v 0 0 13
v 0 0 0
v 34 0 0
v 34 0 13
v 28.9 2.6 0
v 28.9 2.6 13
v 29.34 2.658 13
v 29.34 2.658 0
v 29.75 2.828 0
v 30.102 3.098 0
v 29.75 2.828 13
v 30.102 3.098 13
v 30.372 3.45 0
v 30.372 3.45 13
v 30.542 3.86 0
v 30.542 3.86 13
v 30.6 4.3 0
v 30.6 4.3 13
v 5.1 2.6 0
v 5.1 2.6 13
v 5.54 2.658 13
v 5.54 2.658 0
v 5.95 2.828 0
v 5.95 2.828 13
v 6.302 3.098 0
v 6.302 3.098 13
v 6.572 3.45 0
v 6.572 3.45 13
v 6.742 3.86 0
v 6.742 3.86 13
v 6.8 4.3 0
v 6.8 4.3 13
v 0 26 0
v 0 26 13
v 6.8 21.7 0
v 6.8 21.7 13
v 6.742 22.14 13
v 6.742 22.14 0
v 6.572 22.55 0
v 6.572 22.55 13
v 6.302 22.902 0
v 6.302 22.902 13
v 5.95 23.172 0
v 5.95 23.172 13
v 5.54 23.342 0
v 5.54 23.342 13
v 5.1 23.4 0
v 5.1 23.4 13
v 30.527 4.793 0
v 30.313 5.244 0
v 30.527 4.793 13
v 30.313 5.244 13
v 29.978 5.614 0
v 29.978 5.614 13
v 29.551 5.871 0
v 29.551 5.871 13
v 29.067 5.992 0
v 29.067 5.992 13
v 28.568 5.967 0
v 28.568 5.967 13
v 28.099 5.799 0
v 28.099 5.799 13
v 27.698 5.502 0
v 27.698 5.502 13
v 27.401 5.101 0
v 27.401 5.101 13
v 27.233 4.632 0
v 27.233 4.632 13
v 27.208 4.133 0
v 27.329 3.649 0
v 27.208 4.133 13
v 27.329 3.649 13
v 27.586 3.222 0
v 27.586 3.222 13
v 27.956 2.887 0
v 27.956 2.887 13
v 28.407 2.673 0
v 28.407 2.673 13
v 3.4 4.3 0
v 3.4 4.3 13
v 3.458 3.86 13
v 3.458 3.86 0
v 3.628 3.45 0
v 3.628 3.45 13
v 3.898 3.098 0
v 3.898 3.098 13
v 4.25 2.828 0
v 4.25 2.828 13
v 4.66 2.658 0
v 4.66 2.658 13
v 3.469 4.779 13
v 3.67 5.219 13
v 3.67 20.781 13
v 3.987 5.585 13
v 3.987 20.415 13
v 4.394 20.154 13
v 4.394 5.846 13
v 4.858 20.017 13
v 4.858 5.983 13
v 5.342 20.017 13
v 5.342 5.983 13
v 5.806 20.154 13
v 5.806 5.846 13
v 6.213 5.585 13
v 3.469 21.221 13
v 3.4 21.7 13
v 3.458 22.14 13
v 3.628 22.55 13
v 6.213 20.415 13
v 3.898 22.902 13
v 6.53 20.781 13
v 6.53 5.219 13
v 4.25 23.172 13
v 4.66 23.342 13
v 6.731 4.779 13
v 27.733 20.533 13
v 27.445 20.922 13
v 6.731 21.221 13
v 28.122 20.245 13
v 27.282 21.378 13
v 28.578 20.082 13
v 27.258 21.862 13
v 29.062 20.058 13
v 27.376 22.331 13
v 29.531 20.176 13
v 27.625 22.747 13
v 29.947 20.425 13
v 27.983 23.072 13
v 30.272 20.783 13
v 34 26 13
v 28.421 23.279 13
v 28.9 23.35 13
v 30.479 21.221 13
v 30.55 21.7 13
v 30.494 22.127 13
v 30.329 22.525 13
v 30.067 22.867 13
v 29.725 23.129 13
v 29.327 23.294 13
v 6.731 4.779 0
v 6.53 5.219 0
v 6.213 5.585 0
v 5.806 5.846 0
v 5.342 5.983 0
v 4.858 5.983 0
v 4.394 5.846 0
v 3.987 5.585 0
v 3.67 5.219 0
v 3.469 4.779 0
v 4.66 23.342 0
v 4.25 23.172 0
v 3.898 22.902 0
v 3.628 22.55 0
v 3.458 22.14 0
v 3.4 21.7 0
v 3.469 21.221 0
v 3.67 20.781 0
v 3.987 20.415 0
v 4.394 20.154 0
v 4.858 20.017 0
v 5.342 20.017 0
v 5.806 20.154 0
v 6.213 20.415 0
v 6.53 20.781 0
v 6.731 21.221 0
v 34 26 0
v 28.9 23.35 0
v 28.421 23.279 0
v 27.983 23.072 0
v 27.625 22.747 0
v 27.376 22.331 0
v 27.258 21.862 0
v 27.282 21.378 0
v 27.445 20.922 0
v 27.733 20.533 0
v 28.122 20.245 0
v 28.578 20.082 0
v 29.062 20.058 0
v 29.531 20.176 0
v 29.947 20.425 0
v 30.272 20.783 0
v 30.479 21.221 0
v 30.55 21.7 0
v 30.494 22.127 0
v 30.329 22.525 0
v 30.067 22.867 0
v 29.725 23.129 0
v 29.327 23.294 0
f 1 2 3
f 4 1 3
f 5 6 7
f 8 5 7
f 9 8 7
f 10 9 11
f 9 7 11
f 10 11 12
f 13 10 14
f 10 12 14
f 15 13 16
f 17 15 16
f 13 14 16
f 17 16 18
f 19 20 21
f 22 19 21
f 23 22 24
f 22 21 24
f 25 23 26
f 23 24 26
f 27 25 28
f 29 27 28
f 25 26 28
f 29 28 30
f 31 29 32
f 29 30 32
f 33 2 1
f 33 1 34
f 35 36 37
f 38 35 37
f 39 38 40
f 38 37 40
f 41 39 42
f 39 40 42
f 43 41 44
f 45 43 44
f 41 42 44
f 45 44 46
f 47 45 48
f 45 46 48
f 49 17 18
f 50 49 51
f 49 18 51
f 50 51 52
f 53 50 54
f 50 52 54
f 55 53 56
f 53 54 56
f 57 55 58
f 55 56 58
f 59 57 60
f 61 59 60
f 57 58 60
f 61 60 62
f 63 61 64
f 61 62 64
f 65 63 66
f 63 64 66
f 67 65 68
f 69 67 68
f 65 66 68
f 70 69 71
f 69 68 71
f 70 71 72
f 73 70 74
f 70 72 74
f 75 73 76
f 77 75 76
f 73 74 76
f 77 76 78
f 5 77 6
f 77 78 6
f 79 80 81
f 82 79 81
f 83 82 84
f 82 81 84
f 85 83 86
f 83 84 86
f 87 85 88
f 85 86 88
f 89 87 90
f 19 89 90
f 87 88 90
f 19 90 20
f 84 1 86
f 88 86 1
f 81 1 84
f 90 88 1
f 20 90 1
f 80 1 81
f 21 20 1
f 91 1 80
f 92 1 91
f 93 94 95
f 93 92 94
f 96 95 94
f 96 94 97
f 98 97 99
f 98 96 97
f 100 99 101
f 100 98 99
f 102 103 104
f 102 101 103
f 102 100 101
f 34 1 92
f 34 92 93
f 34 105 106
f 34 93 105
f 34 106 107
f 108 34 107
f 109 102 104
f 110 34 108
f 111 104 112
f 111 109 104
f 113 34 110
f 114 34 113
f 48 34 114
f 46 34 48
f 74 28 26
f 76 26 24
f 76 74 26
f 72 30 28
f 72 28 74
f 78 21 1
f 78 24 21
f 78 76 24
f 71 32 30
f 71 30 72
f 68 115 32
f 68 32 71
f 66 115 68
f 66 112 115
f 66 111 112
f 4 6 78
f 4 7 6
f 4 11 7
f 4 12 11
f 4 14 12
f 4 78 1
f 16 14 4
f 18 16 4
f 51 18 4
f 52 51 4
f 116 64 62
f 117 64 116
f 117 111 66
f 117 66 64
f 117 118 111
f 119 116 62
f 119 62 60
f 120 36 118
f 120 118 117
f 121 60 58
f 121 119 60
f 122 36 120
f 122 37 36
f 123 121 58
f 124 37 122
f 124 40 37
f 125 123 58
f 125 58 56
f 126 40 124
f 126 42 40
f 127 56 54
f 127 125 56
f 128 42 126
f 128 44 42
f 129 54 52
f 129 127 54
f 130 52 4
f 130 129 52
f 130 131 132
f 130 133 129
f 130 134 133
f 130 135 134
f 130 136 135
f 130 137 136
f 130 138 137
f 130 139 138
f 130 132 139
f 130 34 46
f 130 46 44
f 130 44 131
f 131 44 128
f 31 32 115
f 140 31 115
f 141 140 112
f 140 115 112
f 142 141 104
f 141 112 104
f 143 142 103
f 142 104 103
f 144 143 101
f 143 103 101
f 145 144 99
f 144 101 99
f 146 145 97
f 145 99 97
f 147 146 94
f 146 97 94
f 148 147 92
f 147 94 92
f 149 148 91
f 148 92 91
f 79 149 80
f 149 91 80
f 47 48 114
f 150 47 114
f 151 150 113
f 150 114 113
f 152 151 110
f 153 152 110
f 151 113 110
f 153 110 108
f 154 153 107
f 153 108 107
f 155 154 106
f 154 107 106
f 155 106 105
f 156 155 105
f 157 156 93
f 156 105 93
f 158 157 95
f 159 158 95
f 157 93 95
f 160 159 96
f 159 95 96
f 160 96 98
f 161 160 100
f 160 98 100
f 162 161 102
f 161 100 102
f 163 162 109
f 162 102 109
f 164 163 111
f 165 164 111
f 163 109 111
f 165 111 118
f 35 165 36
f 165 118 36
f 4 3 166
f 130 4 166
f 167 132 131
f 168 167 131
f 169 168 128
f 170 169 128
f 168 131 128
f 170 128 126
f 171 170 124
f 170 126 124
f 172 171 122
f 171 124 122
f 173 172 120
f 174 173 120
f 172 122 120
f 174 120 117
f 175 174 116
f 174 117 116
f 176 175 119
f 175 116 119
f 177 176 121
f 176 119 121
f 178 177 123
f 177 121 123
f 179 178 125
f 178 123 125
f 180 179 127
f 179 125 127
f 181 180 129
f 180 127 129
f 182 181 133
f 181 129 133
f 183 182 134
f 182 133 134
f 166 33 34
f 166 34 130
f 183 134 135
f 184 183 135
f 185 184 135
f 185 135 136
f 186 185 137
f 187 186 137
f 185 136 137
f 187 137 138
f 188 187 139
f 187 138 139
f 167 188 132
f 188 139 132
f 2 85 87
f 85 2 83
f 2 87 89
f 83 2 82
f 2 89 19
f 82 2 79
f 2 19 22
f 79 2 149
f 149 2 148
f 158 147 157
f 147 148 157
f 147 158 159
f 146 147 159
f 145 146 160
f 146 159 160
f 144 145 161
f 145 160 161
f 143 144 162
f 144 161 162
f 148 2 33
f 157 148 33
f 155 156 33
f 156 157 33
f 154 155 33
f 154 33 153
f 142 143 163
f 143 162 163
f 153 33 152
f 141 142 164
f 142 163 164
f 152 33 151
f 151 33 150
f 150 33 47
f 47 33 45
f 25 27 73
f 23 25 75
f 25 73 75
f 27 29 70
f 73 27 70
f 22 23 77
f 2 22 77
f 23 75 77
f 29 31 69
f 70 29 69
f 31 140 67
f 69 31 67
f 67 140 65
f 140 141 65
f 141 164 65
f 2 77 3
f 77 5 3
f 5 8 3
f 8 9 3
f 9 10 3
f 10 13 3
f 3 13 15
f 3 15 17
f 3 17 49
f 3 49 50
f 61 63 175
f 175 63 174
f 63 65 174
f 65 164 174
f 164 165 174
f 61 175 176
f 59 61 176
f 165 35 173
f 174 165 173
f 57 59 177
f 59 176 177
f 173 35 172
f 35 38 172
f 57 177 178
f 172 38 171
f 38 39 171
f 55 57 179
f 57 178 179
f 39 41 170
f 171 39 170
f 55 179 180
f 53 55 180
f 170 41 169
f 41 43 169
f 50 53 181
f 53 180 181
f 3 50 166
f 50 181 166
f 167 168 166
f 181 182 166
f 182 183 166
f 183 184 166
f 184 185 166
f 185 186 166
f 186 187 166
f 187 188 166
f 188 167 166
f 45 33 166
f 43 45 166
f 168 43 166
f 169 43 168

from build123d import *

# Parameters (mm, degrees)
F0_W     = 34
F0_H     = 26
F1_DEPTH = 13
F3_DEPTH = 25


with BuildPart() as f1:
    # F0 (on Top) → F1 (new body)
    with BuildSketch(Plane.XY):
        with Locations((17, 13)):
            Rectangle(F0_W, F0_H)
    extrude(amount=F1_DEPTH)

    # F2 (on face) → F3 (cut)
    with BuildSketch(Plane.XY.offset(13)):
        with BuildLine():
            Line((5.1, 21.7), (3.4, 21.7))
            ThreePointArc((3.4, 21.7), (5.1, 20), (6.8, 21.7))
            ThreePointArc((6.8, 21.7), (6.302082, 22.902082), (5.1, 23.4))
            Line((5.1, 23.4), (5.1, 21.7))
        make_face()
        with BuildLine():
            ThreePointArc((28.9, 23.35), (27.733274, 20.533274), (30.55, 21.7))
            Line((30.55, 21.7), (28.9, 21.7))
            Line((28.9, 21.7), (28.9, 23.35))
        make_face()
        with BuildLine():
            ThreePointArc((30.6, 4.3), (27.697918, 5.502082), (28.9, 2.6))
            Line((28.9, 2.6), (28.9, 4.3))
            Line((28.9, 4.3), (30.6, 4.3))
        make_face()
        with BuildLine():
            Line((5.1, 4.3), (5.1, 2.6))
            ThreePointArc((5.1, 2.6), (6.302082, 3.097918), (6.8, 4.3))
            ThreePointArc((6.8, 4.3), (5.1, 6), (3.4, 4.3))
            Line((3.4, 4.3), (5.1, 4.3))
        make_face()
        with BuildLine():
            ThreePointArc((3.4, 4.3), (3.897918, 3.097918), (5.1, 2.6))
            Line((5.1, 2.6), (5.1, 4.3))
            Line((5.1, 4.3), (3.4, 4.3))
        make_face()
        with BuildLine():
            Line((28.9, 4.3), (28.9, 2.6))
            ThreePointArc((28.9, 2.6), (30.102082, 3.097918), (30.6, 4.3))
            Line((30.6, 4.3), (28.9, 4.3))
        make_face()
        with BuildLine():
            Line((28.9, 21.7), (30.55, 21.7))
            ThreePointArc((30.55, 21.7), (30.066726, 22.866726), (28.9, 23.35))
            Line((28.9, 23.35), (28.9, 21.7))
        make_face()
        with BuildLine():
            ThreePointArc((5.1, 23.4), (3.897918, 22.902082), (3.4, 21.7))
            Line((3.4, 21.7), (5.1, 21.7))
            Line((5.1, 21.7), (5.1, 23.4))
        make_face()
    extrude(amount=-F3_DEPTH, mode=Mode.SUBTRACT)


solid = f1.part
